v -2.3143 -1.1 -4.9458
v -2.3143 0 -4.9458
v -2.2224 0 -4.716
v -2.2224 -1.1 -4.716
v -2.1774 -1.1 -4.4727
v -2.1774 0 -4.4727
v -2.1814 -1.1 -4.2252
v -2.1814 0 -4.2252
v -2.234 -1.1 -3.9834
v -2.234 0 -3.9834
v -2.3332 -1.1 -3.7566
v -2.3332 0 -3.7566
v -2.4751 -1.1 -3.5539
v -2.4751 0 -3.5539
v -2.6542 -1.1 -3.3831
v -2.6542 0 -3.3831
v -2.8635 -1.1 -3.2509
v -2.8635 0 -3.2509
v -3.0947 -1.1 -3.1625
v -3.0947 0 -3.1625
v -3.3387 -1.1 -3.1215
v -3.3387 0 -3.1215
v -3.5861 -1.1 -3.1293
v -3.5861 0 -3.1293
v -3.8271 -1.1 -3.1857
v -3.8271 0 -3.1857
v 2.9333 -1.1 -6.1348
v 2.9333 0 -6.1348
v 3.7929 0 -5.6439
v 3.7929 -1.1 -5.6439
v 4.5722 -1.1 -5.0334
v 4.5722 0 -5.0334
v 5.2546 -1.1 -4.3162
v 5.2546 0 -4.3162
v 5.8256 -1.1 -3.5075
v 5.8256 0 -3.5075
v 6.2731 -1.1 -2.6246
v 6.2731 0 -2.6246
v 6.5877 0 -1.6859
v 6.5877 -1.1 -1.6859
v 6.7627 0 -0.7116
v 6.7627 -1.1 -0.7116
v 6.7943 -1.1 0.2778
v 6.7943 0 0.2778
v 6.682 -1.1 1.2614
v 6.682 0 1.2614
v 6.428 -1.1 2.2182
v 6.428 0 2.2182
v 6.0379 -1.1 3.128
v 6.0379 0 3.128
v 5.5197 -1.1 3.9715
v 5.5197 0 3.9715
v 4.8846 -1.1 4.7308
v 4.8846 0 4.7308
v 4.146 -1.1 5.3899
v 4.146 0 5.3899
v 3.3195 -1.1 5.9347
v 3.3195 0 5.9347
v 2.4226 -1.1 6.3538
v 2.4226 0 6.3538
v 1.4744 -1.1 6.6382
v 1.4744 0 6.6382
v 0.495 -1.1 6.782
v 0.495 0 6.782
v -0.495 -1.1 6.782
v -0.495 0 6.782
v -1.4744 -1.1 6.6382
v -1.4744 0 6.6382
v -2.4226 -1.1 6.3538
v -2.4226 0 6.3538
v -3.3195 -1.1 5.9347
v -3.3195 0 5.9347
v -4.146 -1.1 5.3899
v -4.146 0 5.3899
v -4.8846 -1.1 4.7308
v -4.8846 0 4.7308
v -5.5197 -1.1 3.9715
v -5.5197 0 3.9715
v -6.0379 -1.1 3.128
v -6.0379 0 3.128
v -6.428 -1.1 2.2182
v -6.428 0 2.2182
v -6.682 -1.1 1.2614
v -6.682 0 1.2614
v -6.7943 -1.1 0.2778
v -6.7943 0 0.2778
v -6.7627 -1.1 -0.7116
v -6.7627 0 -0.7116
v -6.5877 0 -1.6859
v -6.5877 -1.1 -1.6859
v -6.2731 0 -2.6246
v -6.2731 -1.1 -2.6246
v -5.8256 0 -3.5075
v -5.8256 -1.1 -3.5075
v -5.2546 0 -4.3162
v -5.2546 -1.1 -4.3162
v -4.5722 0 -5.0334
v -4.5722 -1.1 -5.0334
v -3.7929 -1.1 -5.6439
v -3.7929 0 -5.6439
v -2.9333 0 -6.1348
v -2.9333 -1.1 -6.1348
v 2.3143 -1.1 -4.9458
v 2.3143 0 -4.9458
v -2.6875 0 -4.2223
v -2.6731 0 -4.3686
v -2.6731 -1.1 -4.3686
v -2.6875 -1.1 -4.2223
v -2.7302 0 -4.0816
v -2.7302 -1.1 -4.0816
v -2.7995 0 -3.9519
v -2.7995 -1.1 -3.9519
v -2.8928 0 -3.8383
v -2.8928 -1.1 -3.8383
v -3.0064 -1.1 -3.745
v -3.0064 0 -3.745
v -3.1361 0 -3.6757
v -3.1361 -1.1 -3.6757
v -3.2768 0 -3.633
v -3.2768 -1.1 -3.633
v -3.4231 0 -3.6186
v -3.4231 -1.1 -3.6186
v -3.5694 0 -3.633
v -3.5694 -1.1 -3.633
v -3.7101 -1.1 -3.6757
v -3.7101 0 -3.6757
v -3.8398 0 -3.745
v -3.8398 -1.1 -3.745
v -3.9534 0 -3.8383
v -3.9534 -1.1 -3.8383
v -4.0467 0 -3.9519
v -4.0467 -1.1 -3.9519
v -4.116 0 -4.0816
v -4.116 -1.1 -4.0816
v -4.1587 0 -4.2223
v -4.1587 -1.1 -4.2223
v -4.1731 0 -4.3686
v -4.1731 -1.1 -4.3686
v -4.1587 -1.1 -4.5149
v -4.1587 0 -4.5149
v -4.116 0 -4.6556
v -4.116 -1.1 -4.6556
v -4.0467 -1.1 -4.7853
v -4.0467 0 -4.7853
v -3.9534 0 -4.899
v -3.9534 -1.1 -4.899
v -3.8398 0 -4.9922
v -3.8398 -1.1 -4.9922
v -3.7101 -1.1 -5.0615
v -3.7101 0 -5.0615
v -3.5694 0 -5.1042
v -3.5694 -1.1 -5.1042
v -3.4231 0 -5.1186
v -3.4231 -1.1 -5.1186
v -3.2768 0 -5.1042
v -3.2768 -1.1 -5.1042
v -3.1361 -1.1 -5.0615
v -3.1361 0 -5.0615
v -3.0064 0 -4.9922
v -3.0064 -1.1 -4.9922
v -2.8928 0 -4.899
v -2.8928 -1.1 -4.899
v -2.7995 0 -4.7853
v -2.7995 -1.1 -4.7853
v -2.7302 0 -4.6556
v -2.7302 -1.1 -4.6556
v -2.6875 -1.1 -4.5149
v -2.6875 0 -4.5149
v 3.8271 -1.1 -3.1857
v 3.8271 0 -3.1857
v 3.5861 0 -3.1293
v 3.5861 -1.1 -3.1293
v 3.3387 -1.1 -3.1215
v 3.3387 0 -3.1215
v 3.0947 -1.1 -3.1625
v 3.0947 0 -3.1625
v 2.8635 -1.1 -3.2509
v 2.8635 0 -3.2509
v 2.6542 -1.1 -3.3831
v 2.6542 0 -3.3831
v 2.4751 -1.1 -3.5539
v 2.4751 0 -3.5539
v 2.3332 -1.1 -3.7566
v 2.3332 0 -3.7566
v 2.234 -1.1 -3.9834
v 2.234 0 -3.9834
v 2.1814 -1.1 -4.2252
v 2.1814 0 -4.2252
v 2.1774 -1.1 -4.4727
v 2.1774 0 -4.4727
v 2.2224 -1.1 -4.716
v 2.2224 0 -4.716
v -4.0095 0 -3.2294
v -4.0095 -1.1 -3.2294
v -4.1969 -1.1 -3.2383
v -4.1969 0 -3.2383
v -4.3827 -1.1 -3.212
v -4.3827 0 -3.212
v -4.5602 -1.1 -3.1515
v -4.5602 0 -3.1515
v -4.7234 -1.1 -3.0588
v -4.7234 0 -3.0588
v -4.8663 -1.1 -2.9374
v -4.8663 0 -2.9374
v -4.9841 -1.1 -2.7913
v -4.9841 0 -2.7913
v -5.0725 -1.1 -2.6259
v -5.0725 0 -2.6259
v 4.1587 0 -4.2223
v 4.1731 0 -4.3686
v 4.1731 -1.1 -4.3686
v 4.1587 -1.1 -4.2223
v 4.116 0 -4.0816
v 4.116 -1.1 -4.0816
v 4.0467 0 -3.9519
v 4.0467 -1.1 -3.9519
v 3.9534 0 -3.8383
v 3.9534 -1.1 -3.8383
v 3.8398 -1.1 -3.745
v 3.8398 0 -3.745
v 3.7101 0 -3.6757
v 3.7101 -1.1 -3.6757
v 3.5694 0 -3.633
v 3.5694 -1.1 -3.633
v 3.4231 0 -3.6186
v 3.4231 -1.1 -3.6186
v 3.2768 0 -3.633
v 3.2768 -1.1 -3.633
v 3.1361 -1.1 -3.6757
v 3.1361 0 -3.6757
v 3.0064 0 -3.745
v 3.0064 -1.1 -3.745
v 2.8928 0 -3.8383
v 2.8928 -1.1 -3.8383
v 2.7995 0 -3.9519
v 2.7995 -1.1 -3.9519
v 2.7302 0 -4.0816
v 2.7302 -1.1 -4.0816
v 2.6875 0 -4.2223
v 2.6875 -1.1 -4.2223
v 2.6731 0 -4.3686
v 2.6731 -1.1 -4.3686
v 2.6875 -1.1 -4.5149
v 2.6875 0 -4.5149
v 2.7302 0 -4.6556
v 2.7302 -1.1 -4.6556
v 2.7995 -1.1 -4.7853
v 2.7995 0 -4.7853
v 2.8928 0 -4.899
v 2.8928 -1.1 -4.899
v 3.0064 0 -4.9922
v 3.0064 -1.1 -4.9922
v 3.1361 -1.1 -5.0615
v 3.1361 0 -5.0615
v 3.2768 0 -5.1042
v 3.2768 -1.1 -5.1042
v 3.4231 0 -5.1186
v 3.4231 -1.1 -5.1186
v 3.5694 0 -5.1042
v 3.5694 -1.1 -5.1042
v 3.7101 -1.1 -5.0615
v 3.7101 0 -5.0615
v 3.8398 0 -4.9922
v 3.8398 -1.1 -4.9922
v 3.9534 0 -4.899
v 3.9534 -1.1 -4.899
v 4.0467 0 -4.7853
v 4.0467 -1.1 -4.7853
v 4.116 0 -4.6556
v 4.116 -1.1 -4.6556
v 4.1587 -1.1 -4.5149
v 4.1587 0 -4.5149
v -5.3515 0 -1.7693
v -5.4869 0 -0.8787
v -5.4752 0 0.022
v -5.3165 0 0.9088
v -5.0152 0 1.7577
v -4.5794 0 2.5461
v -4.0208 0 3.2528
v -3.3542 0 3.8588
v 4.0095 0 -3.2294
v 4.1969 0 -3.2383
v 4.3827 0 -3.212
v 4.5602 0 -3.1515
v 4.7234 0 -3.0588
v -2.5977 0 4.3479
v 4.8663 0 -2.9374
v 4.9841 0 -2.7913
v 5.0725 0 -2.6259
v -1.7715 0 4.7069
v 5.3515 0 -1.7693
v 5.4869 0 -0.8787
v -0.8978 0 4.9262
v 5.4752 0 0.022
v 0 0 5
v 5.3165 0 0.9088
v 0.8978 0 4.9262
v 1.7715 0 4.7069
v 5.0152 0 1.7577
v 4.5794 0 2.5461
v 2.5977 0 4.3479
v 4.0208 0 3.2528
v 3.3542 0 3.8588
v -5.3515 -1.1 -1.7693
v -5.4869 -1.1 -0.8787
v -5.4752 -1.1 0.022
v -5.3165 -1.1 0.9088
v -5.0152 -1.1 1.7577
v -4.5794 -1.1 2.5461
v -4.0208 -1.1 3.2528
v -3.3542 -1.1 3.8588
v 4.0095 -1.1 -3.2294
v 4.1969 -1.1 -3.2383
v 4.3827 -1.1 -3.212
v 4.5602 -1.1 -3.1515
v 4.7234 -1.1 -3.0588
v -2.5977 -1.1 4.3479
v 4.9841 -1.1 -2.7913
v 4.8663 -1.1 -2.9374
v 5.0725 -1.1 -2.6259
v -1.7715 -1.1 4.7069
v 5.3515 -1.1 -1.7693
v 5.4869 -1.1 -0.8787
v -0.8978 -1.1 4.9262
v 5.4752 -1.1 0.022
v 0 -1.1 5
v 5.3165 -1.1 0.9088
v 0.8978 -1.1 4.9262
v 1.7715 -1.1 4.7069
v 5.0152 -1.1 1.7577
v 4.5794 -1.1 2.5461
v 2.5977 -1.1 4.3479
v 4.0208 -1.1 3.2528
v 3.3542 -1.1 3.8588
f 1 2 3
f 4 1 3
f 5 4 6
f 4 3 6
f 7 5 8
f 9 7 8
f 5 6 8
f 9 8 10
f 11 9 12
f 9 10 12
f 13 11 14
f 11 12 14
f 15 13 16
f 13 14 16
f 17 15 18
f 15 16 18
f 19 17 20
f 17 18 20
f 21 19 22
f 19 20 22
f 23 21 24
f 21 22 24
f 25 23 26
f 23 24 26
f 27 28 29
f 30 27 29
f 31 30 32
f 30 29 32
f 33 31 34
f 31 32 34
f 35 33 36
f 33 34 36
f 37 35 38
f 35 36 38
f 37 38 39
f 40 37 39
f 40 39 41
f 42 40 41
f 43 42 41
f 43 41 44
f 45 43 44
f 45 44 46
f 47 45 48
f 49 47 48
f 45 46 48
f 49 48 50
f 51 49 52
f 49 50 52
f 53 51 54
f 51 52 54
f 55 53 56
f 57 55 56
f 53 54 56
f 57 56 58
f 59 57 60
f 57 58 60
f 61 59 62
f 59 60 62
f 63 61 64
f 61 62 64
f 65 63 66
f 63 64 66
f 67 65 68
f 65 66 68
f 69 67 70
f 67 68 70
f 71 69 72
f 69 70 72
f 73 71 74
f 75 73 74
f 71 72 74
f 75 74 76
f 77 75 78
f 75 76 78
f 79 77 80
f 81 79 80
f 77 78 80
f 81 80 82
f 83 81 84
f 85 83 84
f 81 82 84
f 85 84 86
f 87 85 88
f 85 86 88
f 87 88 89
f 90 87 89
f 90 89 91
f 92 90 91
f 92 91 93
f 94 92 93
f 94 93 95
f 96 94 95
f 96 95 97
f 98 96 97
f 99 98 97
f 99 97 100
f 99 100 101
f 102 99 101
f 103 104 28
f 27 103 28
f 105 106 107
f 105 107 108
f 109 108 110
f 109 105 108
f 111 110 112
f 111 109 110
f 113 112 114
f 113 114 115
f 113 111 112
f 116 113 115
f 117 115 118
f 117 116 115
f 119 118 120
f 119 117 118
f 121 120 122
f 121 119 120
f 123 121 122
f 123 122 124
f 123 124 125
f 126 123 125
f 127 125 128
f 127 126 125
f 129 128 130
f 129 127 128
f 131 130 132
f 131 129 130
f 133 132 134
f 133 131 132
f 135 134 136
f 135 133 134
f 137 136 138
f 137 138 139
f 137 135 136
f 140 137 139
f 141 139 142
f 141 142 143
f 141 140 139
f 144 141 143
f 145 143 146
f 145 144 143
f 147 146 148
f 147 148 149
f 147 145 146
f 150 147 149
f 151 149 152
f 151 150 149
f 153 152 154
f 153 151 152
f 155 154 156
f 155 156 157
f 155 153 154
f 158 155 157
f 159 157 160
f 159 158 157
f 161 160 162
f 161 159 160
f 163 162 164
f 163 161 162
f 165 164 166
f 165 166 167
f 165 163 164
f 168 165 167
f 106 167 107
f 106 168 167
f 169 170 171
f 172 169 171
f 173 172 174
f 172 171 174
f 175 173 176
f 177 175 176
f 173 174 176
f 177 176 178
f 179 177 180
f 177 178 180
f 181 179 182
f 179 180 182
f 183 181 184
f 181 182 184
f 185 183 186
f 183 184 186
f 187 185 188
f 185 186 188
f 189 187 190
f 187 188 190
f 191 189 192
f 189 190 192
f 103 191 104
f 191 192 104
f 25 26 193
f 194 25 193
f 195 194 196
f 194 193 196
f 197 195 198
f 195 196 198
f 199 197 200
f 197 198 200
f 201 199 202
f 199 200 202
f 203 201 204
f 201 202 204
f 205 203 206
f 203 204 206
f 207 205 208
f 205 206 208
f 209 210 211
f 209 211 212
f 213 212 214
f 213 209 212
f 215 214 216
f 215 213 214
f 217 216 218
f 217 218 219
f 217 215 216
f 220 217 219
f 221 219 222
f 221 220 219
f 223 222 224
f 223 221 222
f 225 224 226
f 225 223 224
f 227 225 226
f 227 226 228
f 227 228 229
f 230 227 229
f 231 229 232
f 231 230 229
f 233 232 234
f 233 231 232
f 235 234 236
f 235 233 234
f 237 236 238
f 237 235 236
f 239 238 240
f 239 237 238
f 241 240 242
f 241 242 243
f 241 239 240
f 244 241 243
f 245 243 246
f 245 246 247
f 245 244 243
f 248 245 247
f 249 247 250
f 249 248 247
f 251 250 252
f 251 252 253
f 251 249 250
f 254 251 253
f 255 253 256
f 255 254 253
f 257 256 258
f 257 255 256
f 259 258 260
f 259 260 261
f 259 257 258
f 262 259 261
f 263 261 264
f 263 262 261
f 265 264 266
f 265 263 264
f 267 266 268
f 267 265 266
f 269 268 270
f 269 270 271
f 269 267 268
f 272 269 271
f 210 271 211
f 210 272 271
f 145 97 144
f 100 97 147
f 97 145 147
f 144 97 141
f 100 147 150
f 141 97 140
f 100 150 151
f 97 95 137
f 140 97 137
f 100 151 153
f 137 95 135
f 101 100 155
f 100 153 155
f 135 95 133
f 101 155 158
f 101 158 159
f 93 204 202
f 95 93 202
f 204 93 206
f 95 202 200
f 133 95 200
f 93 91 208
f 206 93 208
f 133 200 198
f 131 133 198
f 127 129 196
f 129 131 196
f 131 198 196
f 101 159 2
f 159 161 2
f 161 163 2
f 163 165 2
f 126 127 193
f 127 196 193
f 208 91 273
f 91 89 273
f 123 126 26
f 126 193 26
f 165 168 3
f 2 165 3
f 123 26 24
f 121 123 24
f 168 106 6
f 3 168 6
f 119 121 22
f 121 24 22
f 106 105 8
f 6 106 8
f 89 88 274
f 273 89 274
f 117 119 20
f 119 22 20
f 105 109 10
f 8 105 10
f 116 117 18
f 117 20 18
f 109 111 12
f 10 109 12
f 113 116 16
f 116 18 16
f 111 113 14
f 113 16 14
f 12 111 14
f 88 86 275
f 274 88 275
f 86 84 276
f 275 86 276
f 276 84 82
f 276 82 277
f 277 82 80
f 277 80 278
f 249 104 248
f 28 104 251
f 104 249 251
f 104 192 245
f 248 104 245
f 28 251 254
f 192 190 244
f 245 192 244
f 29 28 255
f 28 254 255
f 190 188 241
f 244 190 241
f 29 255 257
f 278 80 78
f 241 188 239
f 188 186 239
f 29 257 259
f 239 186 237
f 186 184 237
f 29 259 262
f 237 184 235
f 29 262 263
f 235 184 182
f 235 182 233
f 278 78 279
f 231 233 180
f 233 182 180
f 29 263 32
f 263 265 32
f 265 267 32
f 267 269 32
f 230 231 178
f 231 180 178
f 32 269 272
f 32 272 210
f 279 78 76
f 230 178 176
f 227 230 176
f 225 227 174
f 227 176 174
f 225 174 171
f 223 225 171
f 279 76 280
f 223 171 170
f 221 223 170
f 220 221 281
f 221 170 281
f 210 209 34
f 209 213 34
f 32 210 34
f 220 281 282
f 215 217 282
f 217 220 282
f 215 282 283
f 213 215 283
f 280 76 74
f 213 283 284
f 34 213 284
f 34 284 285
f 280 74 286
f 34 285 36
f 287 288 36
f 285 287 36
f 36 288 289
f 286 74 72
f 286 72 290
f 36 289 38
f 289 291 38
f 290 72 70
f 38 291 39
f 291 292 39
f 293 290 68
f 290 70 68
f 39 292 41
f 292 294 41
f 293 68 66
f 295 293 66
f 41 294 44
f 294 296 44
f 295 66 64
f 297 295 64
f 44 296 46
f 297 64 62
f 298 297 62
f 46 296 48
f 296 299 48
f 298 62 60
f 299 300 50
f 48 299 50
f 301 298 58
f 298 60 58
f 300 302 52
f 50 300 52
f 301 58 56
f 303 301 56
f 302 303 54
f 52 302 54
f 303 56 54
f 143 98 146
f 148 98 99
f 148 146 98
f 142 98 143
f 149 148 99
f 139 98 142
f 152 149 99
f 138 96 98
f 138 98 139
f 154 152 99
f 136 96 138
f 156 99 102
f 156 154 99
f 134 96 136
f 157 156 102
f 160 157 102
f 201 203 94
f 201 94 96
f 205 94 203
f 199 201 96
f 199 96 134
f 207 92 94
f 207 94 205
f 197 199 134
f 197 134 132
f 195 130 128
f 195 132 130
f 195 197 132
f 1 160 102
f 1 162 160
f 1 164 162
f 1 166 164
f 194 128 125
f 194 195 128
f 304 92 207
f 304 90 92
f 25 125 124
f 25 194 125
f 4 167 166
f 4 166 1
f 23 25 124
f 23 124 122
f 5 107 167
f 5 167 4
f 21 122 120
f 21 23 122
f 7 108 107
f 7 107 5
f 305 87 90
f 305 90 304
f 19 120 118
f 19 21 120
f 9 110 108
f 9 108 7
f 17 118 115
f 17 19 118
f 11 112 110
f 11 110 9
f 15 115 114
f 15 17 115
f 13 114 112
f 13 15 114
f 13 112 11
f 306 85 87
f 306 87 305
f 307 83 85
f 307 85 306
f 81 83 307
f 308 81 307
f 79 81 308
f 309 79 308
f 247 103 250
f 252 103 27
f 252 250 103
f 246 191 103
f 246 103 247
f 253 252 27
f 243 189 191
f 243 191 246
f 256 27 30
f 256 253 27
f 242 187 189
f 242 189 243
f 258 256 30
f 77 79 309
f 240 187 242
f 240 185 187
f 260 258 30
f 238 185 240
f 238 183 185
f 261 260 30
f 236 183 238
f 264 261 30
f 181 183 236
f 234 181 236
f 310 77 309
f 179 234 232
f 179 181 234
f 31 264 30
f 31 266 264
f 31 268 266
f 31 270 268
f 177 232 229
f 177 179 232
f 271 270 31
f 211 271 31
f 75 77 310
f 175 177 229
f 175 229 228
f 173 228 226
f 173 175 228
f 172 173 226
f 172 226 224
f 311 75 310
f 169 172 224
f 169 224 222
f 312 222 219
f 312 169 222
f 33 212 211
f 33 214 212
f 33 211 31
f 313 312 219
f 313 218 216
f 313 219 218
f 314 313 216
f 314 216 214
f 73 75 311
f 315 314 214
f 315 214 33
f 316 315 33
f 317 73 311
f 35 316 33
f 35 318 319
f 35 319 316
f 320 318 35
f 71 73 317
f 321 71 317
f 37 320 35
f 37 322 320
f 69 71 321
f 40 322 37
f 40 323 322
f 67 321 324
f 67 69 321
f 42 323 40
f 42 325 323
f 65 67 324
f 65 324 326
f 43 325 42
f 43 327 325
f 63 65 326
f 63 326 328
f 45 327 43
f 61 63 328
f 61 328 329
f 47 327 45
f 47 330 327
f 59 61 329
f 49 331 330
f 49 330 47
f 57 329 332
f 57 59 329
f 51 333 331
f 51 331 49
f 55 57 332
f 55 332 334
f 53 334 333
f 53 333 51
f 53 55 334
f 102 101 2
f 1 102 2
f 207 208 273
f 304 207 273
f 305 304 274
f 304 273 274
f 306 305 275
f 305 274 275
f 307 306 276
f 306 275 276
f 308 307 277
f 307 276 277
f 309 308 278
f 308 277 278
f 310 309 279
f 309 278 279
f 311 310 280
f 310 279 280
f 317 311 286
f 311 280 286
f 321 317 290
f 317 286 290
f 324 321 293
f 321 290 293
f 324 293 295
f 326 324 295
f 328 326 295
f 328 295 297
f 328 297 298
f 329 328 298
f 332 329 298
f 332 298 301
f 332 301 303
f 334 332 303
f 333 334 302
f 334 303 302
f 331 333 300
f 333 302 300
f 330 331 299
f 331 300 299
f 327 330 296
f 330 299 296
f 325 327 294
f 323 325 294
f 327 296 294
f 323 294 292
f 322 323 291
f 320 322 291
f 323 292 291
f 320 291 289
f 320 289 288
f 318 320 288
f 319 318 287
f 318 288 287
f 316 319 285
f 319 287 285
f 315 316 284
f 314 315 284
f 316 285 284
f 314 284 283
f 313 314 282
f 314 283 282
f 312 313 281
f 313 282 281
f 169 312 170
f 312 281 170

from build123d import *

# Parameters (mm, degrees)
F0_R     = 0.75
F1_DEPTH = 1.1


# Not quite as in the source:
# - a feature of the source that left no trace in its solid (it failed there, or was rolled back) is left out


with BuildPart() as f1:
    # F0 (on Front) → F1 (new body)
    with BuildSketch(Plane.XZ):
        with BuildLine():
            Line((2.3143409039, -4.9458075121), (2.9332922899, -6.1348020622))
            ThreePointArc((2.9332922899, -6.1348020622), (0, 6.8), (-2.9332922899, -6.1348020622))
            Line((-2.9332922899, -6.1348020622), (-2.3143409039, -4.9458075121))
            ThreePointArc((-2.3143409039, -4.9458075121), (-2.4751182669, -3.5538688963), (-3.8270774065, -3.1856991587))
            ThreePointArc((-3.8270774065, -3.1856991587), (-4.5602291476, -3.1514585807), (-5.0725348367, -2.6258857756))
            ThreePointArc((-5.0725348367, -2.6258857756), (0, 5), (5.0725348367, -2.6258857756))
            ThreePointArc((5.0725348367, -2.6258857756), (4.5602291476, -3.1514585807), (3.8270774065, -3.1856991587))
            ThreePointArc((3.8270774065, -3.1856991587), (2.4751182669, -3.5538688963), (2.3143409039, -4.9458075121))
        make_face()
        with Locations((-3.4231044454, -4.3686217456)):
            Circle(F0_R, mode=Mode.SUBTRACT)
        with Locations((3.4231044454, -4.3686217456)):
            Circle(F0_R, mode=Mode.SUBTRACT)
    extrude(amount=F1_DEPTH)


solid = f1.part
